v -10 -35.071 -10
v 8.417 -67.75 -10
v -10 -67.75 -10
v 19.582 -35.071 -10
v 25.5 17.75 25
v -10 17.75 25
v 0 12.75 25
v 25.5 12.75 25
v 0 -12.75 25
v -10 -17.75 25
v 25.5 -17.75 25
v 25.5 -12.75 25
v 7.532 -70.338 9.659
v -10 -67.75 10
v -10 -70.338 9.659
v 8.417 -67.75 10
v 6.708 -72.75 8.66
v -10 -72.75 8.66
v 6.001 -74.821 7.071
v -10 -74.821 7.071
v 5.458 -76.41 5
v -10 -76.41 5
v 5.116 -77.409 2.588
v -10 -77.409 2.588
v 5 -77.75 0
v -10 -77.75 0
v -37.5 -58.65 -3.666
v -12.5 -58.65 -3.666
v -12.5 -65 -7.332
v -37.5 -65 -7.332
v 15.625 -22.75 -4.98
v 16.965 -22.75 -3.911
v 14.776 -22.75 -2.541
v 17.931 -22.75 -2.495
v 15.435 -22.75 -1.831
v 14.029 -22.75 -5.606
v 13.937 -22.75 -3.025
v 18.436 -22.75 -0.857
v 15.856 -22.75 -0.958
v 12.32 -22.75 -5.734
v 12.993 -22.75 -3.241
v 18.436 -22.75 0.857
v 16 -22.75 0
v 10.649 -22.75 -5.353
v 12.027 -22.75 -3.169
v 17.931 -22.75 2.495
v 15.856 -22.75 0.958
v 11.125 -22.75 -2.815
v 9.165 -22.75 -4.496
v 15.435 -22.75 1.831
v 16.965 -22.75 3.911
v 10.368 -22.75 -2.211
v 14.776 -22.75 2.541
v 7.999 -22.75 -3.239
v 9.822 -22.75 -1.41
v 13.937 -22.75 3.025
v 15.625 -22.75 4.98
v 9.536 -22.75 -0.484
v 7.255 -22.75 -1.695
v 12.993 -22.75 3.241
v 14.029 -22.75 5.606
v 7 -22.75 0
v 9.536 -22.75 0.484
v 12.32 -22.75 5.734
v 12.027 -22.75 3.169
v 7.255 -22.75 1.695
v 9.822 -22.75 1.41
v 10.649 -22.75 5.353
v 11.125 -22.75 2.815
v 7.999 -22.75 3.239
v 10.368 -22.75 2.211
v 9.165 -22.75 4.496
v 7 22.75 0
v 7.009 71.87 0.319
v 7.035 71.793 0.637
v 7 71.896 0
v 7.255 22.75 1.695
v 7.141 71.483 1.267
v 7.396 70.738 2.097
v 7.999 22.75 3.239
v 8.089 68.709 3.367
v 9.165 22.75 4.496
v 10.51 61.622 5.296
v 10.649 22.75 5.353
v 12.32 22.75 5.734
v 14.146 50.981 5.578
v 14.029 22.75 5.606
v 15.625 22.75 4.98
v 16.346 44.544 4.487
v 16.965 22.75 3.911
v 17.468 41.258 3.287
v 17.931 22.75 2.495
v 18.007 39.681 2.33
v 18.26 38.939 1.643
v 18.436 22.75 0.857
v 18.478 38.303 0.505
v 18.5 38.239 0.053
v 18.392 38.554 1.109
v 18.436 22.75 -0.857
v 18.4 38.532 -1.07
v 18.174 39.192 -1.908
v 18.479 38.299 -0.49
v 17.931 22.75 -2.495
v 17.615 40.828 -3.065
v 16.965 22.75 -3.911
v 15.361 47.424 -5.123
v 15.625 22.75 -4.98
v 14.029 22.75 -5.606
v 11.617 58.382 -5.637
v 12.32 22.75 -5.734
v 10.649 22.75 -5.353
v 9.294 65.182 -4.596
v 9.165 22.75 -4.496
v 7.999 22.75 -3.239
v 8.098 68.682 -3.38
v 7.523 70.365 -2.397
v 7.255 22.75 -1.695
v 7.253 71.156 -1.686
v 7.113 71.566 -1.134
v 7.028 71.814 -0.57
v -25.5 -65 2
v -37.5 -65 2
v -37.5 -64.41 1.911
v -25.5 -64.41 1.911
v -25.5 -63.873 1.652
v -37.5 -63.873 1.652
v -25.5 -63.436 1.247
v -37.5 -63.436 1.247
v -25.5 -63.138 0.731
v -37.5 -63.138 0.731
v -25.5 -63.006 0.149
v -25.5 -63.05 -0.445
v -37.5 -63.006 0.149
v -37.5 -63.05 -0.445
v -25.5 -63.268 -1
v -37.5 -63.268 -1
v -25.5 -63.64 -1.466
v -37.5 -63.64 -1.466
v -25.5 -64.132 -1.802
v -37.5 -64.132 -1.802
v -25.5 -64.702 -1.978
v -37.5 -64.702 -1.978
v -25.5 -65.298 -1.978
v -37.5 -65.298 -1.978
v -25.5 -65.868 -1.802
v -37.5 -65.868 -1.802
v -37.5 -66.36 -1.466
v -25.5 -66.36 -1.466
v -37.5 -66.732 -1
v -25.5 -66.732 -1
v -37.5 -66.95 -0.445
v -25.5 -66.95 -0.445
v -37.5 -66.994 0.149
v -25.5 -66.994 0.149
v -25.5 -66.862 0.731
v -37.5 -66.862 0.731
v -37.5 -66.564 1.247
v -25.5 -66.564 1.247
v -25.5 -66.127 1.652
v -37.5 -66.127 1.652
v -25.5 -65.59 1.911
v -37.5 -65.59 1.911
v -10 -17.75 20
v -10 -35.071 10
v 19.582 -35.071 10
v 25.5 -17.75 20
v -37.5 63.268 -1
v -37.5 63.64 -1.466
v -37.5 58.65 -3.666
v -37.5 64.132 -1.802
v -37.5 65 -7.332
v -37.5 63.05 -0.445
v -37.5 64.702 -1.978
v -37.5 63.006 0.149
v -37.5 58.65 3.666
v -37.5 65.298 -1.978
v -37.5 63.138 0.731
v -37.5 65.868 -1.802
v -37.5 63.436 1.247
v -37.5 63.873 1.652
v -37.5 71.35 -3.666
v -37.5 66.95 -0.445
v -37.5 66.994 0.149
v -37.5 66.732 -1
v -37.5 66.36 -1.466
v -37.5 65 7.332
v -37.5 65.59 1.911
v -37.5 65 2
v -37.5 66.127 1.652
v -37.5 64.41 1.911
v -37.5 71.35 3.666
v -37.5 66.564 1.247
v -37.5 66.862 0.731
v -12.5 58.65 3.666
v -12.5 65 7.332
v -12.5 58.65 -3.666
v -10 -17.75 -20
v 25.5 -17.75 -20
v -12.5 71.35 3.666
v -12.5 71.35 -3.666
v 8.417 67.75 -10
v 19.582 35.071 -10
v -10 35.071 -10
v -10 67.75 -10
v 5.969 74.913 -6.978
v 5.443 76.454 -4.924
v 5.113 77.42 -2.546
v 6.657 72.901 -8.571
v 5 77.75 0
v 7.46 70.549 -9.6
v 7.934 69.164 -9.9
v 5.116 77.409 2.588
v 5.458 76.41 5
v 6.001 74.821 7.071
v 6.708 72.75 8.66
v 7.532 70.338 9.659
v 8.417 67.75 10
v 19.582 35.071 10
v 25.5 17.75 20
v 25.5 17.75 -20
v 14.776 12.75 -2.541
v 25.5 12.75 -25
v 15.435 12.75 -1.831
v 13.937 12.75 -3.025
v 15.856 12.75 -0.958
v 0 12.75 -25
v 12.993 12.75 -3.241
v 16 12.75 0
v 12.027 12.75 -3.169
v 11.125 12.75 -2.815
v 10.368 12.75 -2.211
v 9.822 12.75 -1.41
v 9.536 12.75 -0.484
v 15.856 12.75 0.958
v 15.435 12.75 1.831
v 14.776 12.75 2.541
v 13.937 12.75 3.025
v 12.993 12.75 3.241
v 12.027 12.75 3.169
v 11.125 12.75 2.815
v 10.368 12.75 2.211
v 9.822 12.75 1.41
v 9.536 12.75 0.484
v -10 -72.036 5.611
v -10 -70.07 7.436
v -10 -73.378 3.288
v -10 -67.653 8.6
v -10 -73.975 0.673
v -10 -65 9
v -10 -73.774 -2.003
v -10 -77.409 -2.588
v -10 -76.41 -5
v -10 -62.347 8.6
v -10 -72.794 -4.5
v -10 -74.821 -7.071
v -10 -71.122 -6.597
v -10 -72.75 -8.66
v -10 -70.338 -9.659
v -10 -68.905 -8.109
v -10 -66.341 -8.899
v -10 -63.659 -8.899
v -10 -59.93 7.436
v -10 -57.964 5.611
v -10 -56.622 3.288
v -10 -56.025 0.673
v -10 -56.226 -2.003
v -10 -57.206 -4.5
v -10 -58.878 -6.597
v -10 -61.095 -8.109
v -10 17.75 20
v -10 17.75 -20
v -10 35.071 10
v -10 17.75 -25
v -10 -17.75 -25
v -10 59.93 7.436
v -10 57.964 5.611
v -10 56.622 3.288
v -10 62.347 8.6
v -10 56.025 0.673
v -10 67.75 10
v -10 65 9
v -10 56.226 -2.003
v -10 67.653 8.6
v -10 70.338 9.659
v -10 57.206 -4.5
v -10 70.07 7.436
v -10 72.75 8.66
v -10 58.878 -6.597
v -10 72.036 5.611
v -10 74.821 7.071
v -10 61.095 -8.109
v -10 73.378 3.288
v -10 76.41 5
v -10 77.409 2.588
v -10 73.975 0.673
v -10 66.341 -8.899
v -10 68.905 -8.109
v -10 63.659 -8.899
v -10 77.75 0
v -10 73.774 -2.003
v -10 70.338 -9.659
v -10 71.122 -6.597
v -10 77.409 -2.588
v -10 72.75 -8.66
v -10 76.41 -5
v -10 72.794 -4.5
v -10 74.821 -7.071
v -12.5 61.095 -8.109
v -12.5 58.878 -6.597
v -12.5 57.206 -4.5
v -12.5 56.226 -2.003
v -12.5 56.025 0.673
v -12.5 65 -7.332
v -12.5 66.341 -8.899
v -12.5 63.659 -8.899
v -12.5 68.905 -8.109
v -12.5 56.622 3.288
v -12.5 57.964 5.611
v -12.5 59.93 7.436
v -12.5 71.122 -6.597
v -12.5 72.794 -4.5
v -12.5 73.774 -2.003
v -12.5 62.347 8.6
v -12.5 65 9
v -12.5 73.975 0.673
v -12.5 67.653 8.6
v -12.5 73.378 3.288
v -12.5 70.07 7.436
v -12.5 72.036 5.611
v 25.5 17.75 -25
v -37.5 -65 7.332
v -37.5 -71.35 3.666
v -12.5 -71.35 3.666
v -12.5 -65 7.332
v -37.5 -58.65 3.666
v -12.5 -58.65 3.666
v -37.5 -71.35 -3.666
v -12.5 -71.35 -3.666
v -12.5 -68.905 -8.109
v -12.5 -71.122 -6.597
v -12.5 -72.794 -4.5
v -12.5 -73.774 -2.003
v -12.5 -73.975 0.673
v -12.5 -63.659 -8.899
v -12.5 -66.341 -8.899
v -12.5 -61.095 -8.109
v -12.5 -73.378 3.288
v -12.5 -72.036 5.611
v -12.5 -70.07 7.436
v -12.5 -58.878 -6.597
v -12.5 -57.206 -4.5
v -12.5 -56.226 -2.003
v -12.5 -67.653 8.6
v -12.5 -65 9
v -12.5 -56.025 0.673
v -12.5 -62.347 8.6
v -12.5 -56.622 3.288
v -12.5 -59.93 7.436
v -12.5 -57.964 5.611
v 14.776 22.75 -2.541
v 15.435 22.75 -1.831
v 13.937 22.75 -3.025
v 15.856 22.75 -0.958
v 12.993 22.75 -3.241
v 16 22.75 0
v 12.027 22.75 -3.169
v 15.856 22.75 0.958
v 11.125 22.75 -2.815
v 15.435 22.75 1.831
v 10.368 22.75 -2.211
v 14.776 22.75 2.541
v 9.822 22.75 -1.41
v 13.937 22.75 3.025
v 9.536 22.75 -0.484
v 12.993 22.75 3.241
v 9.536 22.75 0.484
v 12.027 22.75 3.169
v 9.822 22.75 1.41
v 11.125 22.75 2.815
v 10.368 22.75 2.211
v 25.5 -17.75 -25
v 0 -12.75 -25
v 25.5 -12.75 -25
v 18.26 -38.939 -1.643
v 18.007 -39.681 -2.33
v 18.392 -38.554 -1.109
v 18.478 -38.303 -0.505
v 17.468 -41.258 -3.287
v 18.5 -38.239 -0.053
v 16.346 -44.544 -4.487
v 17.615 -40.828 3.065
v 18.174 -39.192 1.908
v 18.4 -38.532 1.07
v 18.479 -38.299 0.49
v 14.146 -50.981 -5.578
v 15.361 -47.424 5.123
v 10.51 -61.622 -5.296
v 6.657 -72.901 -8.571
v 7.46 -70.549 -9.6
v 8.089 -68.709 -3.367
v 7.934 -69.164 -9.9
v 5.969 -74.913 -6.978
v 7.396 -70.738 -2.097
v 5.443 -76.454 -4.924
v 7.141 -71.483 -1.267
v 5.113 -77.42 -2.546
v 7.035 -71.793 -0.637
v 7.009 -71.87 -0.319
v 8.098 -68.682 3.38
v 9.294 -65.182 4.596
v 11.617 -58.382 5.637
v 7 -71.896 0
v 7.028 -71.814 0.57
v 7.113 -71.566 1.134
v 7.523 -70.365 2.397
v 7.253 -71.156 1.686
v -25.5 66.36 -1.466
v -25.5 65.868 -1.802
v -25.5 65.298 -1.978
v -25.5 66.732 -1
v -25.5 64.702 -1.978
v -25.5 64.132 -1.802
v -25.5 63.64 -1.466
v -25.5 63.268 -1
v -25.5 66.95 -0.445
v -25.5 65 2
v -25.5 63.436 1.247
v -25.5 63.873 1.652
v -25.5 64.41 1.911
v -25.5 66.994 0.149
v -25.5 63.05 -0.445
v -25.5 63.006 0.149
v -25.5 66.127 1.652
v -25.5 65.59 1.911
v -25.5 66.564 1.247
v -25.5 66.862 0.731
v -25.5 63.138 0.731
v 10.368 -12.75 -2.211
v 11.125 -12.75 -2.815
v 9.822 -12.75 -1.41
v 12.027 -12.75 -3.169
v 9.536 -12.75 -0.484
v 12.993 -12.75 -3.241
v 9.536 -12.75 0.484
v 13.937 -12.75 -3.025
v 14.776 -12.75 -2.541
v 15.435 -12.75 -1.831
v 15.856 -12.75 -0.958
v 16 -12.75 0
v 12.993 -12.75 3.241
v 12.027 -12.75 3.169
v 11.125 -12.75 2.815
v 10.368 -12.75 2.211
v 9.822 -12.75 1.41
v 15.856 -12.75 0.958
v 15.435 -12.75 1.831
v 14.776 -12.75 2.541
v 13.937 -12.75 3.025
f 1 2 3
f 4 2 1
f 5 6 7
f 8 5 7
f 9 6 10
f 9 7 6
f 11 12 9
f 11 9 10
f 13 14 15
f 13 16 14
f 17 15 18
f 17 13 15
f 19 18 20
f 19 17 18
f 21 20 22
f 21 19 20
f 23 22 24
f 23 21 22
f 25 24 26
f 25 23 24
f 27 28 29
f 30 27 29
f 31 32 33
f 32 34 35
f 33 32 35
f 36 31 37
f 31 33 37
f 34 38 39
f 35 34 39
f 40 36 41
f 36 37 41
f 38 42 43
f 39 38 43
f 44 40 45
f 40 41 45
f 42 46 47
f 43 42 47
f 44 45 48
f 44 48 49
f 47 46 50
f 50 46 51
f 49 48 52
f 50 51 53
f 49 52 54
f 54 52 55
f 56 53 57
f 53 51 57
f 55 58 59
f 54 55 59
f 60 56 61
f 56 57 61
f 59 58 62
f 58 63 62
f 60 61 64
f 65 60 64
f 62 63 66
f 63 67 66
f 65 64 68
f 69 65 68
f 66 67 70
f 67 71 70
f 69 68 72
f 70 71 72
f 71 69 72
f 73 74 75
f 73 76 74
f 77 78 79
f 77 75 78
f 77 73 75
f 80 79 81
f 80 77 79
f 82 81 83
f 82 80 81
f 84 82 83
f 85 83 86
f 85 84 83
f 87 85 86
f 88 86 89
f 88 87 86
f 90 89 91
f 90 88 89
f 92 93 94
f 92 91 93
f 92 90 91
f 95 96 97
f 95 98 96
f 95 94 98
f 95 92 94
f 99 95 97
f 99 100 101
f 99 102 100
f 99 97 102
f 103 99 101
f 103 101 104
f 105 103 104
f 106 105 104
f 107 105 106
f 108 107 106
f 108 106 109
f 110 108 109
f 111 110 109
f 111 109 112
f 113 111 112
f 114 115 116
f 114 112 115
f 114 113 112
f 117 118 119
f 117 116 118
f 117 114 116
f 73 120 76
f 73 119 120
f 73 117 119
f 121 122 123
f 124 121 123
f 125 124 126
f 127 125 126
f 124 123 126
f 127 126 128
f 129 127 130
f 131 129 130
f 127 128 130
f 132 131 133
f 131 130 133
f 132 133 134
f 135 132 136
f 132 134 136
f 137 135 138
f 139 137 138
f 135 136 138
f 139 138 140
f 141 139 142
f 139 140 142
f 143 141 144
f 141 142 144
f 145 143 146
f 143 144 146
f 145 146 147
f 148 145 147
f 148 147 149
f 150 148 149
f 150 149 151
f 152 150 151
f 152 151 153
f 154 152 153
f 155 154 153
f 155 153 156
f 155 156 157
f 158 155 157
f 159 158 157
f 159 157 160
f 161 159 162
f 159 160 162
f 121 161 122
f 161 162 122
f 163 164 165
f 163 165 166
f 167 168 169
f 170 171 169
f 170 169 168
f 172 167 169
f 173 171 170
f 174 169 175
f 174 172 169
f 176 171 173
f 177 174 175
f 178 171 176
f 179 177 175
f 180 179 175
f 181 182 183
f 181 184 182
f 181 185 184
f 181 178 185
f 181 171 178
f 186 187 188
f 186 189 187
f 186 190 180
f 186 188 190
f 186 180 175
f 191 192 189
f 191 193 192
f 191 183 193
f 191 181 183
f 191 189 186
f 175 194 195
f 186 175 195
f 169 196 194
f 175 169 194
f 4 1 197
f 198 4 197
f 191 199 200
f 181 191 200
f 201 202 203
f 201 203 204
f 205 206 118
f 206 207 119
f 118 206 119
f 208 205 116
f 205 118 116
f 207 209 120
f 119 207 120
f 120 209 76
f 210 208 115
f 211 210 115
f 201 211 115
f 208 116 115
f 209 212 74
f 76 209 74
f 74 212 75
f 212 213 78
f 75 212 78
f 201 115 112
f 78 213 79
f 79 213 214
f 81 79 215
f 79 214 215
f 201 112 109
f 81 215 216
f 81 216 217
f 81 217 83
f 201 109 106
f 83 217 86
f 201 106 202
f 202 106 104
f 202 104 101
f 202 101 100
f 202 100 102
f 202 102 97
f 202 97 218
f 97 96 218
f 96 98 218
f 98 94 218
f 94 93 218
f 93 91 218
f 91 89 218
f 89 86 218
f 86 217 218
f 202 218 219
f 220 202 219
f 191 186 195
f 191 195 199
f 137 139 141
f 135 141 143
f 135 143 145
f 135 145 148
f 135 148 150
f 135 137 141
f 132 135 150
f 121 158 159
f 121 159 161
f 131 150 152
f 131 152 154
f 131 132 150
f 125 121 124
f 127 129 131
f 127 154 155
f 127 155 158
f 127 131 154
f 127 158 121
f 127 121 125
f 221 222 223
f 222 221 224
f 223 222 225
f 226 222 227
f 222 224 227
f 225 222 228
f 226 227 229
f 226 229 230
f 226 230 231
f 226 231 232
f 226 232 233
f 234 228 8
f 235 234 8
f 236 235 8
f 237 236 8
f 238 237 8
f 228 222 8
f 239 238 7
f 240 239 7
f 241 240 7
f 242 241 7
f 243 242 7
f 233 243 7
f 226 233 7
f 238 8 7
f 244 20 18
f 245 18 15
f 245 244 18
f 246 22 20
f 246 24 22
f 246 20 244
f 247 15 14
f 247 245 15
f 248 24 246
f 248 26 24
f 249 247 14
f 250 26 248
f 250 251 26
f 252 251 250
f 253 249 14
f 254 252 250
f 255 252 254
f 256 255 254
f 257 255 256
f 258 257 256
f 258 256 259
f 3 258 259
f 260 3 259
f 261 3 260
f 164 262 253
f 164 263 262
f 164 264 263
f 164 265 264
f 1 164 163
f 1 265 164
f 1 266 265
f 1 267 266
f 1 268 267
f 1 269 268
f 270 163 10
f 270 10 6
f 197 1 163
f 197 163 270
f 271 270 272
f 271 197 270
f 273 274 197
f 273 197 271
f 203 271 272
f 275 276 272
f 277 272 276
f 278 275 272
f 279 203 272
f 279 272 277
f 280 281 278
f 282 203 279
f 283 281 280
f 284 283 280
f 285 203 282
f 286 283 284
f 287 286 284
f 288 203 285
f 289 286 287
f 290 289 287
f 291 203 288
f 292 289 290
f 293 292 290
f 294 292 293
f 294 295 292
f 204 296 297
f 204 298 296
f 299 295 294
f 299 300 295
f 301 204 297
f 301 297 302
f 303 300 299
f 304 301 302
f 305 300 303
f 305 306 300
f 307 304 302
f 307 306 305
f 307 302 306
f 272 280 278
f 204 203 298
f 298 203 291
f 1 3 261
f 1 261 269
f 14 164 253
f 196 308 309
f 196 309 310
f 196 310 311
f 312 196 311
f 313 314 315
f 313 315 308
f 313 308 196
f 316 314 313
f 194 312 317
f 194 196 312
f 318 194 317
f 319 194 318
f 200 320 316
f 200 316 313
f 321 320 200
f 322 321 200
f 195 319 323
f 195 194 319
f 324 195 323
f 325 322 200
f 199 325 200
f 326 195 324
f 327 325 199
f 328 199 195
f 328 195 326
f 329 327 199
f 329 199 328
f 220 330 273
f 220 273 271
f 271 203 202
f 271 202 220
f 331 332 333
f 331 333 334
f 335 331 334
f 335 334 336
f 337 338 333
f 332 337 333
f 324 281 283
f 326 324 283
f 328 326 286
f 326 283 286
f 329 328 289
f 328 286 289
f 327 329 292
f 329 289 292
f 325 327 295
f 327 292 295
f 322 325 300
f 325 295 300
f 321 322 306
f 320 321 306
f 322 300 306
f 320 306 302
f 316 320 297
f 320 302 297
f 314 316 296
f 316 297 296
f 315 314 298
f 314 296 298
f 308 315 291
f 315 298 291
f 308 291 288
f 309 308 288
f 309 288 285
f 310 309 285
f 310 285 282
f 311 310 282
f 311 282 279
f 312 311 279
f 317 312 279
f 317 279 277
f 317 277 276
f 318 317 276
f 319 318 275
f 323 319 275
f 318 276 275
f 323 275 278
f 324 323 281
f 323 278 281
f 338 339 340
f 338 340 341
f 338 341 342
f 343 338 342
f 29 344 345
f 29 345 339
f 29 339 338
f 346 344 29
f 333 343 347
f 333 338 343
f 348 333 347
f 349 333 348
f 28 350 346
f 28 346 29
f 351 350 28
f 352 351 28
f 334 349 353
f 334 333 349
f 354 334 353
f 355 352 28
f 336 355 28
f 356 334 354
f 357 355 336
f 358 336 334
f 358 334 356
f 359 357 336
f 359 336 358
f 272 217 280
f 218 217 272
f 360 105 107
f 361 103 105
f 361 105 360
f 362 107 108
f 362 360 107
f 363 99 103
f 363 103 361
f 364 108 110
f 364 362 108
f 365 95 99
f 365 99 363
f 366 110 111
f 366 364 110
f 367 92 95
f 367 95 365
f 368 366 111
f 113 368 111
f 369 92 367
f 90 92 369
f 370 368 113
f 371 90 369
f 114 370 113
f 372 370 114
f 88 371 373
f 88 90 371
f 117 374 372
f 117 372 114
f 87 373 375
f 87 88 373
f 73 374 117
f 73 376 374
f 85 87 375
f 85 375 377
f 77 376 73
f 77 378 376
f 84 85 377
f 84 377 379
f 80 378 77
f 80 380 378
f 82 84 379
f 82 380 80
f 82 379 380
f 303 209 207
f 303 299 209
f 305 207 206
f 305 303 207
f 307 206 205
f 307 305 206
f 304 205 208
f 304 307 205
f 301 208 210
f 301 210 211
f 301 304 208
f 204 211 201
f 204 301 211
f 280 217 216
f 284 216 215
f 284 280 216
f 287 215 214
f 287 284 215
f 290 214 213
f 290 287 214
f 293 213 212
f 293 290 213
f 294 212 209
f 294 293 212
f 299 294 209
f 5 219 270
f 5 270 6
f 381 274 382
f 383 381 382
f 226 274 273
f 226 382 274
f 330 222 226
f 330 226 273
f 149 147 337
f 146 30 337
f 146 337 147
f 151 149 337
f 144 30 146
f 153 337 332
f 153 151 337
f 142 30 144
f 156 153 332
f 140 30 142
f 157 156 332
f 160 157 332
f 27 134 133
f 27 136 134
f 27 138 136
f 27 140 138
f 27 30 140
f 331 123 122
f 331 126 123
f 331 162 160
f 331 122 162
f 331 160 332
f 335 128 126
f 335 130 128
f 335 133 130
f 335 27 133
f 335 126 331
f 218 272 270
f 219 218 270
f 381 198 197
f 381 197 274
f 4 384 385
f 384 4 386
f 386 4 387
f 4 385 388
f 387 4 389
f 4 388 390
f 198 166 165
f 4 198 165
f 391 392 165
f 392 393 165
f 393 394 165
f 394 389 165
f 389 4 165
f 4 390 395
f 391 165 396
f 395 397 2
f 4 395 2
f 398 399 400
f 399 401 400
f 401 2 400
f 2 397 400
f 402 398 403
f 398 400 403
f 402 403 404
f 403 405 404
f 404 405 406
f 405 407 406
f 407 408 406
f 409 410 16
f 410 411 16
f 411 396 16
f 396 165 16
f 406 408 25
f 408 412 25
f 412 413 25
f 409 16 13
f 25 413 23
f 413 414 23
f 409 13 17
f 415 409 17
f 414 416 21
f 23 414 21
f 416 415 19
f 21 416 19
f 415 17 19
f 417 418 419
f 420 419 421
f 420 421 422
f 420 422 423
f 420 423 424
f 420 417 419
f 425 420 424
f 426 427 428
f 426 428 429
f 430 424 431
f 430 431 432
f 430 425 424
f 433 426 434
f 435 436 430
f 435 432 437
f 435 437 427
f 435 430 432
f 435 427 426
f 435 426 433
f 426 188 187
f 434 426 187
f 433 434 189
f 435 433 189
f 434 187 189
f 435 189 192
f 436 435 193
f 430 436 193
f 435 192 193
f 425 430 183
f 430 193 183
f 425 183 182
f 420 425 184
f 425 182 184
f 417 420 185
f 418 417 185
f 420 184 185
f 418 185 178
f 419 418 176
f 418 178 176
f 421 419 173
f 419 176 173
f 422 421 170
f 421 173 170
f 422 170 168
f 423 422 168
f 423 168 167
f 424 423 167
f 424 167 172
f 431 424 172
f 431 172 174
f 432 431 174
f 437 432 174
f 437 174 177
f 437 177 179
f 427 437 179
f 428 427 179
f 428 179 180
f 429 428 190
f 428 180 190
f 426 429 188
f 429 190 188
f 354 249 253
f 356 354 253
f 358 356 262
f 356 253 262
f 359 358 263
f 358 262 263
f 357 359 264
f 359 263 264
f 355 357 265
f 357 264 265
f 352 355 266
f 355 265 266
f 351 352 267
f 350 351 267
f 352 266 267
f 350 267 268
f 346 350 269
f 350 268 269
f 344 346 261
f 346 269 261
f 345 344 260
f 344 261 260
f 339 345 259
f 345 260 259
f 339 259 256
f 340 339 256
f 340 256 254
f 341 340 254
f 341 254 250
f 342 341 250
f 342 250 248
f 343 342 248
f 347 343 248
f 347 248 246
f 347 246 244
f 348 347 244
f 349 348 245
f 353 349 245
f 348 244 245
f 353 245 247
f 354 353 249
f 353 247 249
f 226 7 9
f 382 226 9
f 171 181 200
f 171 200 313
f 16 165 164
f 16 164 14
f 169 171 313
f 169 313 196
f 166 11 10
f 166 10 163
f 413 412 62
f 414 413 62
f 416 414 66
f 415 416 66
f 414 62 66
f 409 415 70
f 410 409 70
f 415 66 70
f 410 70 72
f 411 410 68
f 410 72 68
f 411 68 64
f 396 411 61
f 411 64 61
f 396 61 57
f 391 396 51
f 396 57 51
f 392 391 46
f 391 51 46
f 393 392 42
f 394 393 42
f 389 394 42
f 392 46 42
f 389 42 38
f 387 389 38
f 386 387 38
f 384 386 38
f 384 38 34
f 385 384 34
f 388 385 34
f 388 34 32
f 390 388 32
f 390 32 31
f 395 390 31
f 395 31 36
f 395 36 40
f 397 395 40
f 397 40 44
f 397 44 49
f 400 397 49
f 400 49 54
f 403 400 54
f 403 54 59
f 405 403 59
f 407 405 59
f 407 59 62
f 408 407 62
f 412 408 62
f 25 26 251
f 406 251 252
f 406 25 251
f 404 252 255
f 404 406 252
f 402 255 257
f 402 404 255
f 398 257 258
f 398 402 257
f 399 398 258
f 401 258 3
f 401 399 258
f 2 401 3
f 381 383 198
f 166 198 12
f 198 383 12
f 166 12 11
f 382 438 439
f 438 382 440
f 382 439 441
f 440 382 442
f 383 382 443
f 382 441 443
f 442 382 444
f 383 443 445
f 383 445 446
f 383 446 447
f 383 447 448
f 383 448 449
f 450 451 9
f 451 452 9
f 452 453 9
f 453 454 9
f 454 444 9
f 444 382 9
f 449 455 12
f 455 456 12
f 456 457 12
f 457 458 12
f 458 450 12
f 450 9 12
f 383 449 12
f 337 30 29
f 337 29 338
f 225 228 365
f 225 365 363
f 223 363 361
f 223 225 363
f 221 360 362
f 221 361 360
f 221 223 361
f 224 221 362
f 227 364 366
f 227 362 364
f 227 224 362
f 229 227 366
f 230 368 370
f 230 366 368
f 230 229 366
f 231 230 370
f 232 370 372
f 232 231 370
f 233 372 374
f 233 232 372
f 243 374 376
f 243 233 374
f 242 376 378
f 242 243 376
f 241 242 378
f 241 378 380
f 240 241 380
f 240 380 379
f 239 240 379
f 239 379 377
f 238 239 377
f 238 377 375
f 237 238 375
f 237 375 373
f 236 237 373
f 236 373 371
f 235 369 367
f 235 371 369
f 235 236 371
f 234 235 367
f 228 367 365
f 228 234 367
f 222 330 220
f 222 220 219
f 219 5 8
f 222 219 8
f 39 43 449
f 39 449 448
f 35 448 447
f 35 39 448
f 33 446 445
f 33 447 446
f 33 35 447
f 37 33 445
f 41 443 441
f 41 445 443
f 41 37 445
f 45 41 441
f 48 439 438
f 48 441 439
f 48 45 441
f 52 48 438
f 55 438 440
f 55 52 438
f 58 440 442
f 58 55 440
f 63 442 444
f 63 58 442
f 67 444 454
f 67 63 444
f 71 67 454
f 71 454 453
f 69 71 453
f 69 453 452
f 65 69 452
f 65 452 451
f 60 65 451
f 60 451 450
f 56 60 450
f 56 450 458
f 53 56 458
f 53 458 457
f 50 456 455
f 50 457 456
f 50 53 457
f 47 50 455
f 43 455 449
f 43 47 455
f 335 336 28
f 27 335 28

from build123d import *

# Parameters (mm, degrees)
BOSS_EXTRUDE1_DEPTH     = 25
BOSS_EXTRUDE2_DEPTH     = 10
BOSS_EXTRUDE7_DEPTH     = 5
SKETCH4_R               = 9
BOSS_EXTRUDE4_DEPTH     = 2.5
BOSS_EXTRUDE6_DEPTH     = 25
SKETCH7_R               = 2
CUT_EXTRUDE1_DEPTH      = 12
FILLET1_R               = 10
CHAMFER1_SIZE           = 17.320508076
CHAMFER1_SIZE_2         = 10
CUT_EXTRUDE2_DEPTH      = 90.868306427
CUT_EXTRUDE2_DEPTH_BACK = 90.868306427
SKETCH9_R               = 3.25
SKETCH10_R              = 5.75
CUT_EXTRUDE3_DEPTH      = 111.143088753


# Some blends are built 0.0001 mm under size
with BuildPart() as part:
    # Sketch1 → Boss-Extrude1 (new, symmetric)
    with BuildSketch(Plane.XY):
        Polygon((25.5, -12.75), (25.5, -17.75), (-5, -17.75), (-5, 17.75), (25.5, 17.75), (25.5, 12.75), (0, 12.75), (0, -12.75), align=None)
    extrude(amount=BOSS_EXTRUDE1_DEPTH, both=True)

    # Sketch2 → Boss-Extrude2 (add, symmetric)
    with BuildSketch(Plane.XY):
        Polygon((-5, 17.75), (-5, 77.75), (5, 77.75), (25.5, 17.75), align=None)
        Polygon((5, -77.75), (-5, -77.75), (-5, -17.75), (25.5, -17.75), align=None)
    extrude(amount=BOSS_EXTRUDE2_DEPTH, both=True)

    # Sketch8 → Boss-Extrude7 (add)
    with BuildSketch(Plane.ZY.offset(5)):
        Polygon((10, 17.75), (25, 17.75), (25, -17.75), (10, -17.75), (10, -77.75), (-10, -77.75), (-10, -17.75), (-25, -17.75), (-25, 17.75), (-10, 17.75), (-10, 77.75), (10, 77.75), align=None)
    extrude(amount=BOSS_EXTRUDE7_DEPTH)

    # Sketch4 → Boss-Extrude4 (add)
    with BuildSketch(Plane.ZY.offset(10)):
        with Locations((0, 65)):
            Circle(SKETCH4_R)
        with Locations((0, -65)):
            Circle(SKETCH4_R)
    extrude(amount=BOSS_EXTRUDE4_DEPTH)

    # Sketch6 → Boss-Extrude6 (add)
    with BuildSketch(Plane.ZY.offset(12.5)):
        Polygon((7.332348419, 65), (3.666174209, 71.35), (-3.666174209, 71.35), (-7.332348419, 65), (-3.666174209, 58.65), (3.666174209, 58.65), align=None)
        Polygon((7.332348419, -65), (3.666174209, -58.65), (-3.666174209, -58.65), (-7.332348419, -65), (-3.666174209, -71.35), (3.666174209, -71.35), align=None)
    extrude(amount=BOSS_EXTRUDE6_DEPTH)

    # Sketch7 → Cut-Extrude1 (cut)
    with BuildSketch(Plane.ZY.offset(37.5)):
        with Locations((0, 65)):
            Circle(SKETCH7_R)
        with Locations((0, -65)):
            Circle(SKETCH7_R)
    extrude(amount=-CUT_EXTRUDE1_DEPTH, mode=Mode.SUBTRACT)

    # Fillet1
    fillet1_edges = [part.edges().sort_by_distance(p)[0] for p in [
        (-2.5, -77.75, -10),
        (-2.5, -77.75, 10),
        (-2.5, 77.75, -10),
        (-2.5, 77.75, 10),
    ]]
    fillet(fillet1_edges, radius=FILLET1_R - 0.0001)  # a hair under: the kernel refuses the full size

    # Chamfer1
    # the kernel refuses this chamfer: 17.320508076, 10 mm, written as the material it adds along each edge
    with BuildSketch(Plane(origin=(-10, 17.75, -10), x_dir=(0, 0.999813220622208, 0.019326765612700598), z_dir=(1, 0, 0))) as chamfer1_piece_1_section:
        Polygon((CHAMFER1_SIZE * 0.999813220604, -CHAMFER1_SIZE * 0.0193267656124), (-CHAMFER1_SIZE_2 * 0.0193267656127, -CHAMFER1_SIZE_2 * 0.999813220622), (0, 0), align=None)
    chamfer1_piece_1 = extrude(amount=35.5, mode=Mode.PRIVATE)
    chamfer1_piece_1 = split(chamfer1_piece_1, bisect_by=Plane(origin=(21.828322998, 28.496371714, -13.269268631), z_dir=(-0.9462910228001215, -0.32331609945670825, 0)), keep=Keep.TOP, mode=Mode.PRIVATE)
    add(chamfer1_piece_1)
    with BuildSketch(Plane(origin=(25.5, 17.75, 10), x_dir=(0, 0.9998132206222078, -0.019326765612700598), z_dir=(-1, 0, 0))) as chamfer1_piece_2_section:
        Polygon((CHAMFER1_SIZE * 0.999813220604, -CHAMFER1_SIZE * 0.0193267656124), (-CHAMFER1_SIZE_2 * 0.0193267656127, -CHAMFER1_SIZE_2 * 0.999813220622), (0, 0), align=None)
    chamfer1_piece_2 = extrude(amount=35.5, mode=Mode.PRIVATE)
    chamfer1_piece_2 = split(chamfer1_piece_2, bisect_by=Plane(origin=(21.828322998, 28.496371714, 13.269268631), z_dir=(-0.9462910228001215, -0.32331609945670825, 0)), keep=Keep.TOP, mode=Mode.PRIVATE)
    add(chamfer1_piece_2)
    with BuildSketch(Plane(origin=(25.5, -17.75, -10), x_dir=(0, -0.9998132206222078, 0.019326765612700598), z_dir=(-1, 0, 0))) as chamfer1_piece_3_section:
        Polygon((CHAMFER1_SIZE * 0.999813220604, -CHAMFER1_SIZE * 0.0193267656124), (-CHAMFER1_SIZE_2 * 0.0193267656127, -CHAMFER1_SIZE_2 * 0.999813220622), (0, 0), align=None)
    chamfer1_piece_3 = extrude(amount=35.5, mode=Mode.PRIVATE)
    chamfer1_piece_3 = split(chamfer1_piece_3, bisect_by=Plane(origin=(21.828322998, -28.496371714, -13.269268631), z_dir=(-0.9462910228001215, 0.32331609945670825, 0)), keep=Keep.TOP, mode=Mode.PRIVATE)
    add(chamfer1_piece_3)
    with BuildSketch(Plane(origin=(-10, -17.75, 10), x_dir=(0, -0.999813220622208, -0.019326765612700695), z_dir=(1, 0, 0))) as chamfer1_piece_4_section:
        Polygon((CHAMFER1_SIZE * 0.999813220604, -CHAMFER1_SIZE * 0.0193267656124), (-CHAMFER1_SIZE_2 * 0.0193267656127, -CHAMFER1_SIZE_2 * 0.999813220622), (0, 0), align=None)
    chamfer1_piece_4 = extrude(amount=35.5, mode=Mode.PRIVATE)
    chamfer1_piece_4 = split(chamfer1_piece_4, bisect_by=Plane(origin=(21.828322998, -28.496371714, 13.269268631), z_dir=(-0.9462910228001215, 0.32331609945670825, 0)), keep=Keep.TOP, mode=Mode.PRIVATE)
    add(chamfer1_piece_4)

    # Sketch9 → Cut-Extrude2 (cut, two sides: drawn at the far end of the back side and taken through both)
    with BuildSketch(Plane(origin=(0, 0, 0), x_dir=(1, 0, 0), z_dir=(0, 1, 0)).offset(-CUT_EXTRUDE2_DEPTH_BACK)):
        with Locations((12.75, 0)):
            Circle(SKETCH9_R)
    extrude(amount=CUT_EXTRUDE2_DEPTH + CUT_EXTRUDE2_DEPTH_BACK, mode=Mode.SUBTRACT)

    # Sketch10 → Cut-Extrude3 (cut, through all)
    with BuildSketch(Plane(origin=(0, -22.75, 0), x_dir=(1, 0, 0), z_dir=(0, 1, 0))):
        with Locations(Location((12.75, 0, 0), (0, 0, 180))):
            Circle(SKETCH10_R)
    cut_extrude3 = extrude(amount=-CUT_EXTRUDE3_DEPTH, mode=Mode.SUBTRACT)

    # Mirror1: Cut-Extrude3 across plane
    add(cut_extrude3.mirror(Plane.ZX), mode=Mode.SUBTRACT)


solid = part.part
